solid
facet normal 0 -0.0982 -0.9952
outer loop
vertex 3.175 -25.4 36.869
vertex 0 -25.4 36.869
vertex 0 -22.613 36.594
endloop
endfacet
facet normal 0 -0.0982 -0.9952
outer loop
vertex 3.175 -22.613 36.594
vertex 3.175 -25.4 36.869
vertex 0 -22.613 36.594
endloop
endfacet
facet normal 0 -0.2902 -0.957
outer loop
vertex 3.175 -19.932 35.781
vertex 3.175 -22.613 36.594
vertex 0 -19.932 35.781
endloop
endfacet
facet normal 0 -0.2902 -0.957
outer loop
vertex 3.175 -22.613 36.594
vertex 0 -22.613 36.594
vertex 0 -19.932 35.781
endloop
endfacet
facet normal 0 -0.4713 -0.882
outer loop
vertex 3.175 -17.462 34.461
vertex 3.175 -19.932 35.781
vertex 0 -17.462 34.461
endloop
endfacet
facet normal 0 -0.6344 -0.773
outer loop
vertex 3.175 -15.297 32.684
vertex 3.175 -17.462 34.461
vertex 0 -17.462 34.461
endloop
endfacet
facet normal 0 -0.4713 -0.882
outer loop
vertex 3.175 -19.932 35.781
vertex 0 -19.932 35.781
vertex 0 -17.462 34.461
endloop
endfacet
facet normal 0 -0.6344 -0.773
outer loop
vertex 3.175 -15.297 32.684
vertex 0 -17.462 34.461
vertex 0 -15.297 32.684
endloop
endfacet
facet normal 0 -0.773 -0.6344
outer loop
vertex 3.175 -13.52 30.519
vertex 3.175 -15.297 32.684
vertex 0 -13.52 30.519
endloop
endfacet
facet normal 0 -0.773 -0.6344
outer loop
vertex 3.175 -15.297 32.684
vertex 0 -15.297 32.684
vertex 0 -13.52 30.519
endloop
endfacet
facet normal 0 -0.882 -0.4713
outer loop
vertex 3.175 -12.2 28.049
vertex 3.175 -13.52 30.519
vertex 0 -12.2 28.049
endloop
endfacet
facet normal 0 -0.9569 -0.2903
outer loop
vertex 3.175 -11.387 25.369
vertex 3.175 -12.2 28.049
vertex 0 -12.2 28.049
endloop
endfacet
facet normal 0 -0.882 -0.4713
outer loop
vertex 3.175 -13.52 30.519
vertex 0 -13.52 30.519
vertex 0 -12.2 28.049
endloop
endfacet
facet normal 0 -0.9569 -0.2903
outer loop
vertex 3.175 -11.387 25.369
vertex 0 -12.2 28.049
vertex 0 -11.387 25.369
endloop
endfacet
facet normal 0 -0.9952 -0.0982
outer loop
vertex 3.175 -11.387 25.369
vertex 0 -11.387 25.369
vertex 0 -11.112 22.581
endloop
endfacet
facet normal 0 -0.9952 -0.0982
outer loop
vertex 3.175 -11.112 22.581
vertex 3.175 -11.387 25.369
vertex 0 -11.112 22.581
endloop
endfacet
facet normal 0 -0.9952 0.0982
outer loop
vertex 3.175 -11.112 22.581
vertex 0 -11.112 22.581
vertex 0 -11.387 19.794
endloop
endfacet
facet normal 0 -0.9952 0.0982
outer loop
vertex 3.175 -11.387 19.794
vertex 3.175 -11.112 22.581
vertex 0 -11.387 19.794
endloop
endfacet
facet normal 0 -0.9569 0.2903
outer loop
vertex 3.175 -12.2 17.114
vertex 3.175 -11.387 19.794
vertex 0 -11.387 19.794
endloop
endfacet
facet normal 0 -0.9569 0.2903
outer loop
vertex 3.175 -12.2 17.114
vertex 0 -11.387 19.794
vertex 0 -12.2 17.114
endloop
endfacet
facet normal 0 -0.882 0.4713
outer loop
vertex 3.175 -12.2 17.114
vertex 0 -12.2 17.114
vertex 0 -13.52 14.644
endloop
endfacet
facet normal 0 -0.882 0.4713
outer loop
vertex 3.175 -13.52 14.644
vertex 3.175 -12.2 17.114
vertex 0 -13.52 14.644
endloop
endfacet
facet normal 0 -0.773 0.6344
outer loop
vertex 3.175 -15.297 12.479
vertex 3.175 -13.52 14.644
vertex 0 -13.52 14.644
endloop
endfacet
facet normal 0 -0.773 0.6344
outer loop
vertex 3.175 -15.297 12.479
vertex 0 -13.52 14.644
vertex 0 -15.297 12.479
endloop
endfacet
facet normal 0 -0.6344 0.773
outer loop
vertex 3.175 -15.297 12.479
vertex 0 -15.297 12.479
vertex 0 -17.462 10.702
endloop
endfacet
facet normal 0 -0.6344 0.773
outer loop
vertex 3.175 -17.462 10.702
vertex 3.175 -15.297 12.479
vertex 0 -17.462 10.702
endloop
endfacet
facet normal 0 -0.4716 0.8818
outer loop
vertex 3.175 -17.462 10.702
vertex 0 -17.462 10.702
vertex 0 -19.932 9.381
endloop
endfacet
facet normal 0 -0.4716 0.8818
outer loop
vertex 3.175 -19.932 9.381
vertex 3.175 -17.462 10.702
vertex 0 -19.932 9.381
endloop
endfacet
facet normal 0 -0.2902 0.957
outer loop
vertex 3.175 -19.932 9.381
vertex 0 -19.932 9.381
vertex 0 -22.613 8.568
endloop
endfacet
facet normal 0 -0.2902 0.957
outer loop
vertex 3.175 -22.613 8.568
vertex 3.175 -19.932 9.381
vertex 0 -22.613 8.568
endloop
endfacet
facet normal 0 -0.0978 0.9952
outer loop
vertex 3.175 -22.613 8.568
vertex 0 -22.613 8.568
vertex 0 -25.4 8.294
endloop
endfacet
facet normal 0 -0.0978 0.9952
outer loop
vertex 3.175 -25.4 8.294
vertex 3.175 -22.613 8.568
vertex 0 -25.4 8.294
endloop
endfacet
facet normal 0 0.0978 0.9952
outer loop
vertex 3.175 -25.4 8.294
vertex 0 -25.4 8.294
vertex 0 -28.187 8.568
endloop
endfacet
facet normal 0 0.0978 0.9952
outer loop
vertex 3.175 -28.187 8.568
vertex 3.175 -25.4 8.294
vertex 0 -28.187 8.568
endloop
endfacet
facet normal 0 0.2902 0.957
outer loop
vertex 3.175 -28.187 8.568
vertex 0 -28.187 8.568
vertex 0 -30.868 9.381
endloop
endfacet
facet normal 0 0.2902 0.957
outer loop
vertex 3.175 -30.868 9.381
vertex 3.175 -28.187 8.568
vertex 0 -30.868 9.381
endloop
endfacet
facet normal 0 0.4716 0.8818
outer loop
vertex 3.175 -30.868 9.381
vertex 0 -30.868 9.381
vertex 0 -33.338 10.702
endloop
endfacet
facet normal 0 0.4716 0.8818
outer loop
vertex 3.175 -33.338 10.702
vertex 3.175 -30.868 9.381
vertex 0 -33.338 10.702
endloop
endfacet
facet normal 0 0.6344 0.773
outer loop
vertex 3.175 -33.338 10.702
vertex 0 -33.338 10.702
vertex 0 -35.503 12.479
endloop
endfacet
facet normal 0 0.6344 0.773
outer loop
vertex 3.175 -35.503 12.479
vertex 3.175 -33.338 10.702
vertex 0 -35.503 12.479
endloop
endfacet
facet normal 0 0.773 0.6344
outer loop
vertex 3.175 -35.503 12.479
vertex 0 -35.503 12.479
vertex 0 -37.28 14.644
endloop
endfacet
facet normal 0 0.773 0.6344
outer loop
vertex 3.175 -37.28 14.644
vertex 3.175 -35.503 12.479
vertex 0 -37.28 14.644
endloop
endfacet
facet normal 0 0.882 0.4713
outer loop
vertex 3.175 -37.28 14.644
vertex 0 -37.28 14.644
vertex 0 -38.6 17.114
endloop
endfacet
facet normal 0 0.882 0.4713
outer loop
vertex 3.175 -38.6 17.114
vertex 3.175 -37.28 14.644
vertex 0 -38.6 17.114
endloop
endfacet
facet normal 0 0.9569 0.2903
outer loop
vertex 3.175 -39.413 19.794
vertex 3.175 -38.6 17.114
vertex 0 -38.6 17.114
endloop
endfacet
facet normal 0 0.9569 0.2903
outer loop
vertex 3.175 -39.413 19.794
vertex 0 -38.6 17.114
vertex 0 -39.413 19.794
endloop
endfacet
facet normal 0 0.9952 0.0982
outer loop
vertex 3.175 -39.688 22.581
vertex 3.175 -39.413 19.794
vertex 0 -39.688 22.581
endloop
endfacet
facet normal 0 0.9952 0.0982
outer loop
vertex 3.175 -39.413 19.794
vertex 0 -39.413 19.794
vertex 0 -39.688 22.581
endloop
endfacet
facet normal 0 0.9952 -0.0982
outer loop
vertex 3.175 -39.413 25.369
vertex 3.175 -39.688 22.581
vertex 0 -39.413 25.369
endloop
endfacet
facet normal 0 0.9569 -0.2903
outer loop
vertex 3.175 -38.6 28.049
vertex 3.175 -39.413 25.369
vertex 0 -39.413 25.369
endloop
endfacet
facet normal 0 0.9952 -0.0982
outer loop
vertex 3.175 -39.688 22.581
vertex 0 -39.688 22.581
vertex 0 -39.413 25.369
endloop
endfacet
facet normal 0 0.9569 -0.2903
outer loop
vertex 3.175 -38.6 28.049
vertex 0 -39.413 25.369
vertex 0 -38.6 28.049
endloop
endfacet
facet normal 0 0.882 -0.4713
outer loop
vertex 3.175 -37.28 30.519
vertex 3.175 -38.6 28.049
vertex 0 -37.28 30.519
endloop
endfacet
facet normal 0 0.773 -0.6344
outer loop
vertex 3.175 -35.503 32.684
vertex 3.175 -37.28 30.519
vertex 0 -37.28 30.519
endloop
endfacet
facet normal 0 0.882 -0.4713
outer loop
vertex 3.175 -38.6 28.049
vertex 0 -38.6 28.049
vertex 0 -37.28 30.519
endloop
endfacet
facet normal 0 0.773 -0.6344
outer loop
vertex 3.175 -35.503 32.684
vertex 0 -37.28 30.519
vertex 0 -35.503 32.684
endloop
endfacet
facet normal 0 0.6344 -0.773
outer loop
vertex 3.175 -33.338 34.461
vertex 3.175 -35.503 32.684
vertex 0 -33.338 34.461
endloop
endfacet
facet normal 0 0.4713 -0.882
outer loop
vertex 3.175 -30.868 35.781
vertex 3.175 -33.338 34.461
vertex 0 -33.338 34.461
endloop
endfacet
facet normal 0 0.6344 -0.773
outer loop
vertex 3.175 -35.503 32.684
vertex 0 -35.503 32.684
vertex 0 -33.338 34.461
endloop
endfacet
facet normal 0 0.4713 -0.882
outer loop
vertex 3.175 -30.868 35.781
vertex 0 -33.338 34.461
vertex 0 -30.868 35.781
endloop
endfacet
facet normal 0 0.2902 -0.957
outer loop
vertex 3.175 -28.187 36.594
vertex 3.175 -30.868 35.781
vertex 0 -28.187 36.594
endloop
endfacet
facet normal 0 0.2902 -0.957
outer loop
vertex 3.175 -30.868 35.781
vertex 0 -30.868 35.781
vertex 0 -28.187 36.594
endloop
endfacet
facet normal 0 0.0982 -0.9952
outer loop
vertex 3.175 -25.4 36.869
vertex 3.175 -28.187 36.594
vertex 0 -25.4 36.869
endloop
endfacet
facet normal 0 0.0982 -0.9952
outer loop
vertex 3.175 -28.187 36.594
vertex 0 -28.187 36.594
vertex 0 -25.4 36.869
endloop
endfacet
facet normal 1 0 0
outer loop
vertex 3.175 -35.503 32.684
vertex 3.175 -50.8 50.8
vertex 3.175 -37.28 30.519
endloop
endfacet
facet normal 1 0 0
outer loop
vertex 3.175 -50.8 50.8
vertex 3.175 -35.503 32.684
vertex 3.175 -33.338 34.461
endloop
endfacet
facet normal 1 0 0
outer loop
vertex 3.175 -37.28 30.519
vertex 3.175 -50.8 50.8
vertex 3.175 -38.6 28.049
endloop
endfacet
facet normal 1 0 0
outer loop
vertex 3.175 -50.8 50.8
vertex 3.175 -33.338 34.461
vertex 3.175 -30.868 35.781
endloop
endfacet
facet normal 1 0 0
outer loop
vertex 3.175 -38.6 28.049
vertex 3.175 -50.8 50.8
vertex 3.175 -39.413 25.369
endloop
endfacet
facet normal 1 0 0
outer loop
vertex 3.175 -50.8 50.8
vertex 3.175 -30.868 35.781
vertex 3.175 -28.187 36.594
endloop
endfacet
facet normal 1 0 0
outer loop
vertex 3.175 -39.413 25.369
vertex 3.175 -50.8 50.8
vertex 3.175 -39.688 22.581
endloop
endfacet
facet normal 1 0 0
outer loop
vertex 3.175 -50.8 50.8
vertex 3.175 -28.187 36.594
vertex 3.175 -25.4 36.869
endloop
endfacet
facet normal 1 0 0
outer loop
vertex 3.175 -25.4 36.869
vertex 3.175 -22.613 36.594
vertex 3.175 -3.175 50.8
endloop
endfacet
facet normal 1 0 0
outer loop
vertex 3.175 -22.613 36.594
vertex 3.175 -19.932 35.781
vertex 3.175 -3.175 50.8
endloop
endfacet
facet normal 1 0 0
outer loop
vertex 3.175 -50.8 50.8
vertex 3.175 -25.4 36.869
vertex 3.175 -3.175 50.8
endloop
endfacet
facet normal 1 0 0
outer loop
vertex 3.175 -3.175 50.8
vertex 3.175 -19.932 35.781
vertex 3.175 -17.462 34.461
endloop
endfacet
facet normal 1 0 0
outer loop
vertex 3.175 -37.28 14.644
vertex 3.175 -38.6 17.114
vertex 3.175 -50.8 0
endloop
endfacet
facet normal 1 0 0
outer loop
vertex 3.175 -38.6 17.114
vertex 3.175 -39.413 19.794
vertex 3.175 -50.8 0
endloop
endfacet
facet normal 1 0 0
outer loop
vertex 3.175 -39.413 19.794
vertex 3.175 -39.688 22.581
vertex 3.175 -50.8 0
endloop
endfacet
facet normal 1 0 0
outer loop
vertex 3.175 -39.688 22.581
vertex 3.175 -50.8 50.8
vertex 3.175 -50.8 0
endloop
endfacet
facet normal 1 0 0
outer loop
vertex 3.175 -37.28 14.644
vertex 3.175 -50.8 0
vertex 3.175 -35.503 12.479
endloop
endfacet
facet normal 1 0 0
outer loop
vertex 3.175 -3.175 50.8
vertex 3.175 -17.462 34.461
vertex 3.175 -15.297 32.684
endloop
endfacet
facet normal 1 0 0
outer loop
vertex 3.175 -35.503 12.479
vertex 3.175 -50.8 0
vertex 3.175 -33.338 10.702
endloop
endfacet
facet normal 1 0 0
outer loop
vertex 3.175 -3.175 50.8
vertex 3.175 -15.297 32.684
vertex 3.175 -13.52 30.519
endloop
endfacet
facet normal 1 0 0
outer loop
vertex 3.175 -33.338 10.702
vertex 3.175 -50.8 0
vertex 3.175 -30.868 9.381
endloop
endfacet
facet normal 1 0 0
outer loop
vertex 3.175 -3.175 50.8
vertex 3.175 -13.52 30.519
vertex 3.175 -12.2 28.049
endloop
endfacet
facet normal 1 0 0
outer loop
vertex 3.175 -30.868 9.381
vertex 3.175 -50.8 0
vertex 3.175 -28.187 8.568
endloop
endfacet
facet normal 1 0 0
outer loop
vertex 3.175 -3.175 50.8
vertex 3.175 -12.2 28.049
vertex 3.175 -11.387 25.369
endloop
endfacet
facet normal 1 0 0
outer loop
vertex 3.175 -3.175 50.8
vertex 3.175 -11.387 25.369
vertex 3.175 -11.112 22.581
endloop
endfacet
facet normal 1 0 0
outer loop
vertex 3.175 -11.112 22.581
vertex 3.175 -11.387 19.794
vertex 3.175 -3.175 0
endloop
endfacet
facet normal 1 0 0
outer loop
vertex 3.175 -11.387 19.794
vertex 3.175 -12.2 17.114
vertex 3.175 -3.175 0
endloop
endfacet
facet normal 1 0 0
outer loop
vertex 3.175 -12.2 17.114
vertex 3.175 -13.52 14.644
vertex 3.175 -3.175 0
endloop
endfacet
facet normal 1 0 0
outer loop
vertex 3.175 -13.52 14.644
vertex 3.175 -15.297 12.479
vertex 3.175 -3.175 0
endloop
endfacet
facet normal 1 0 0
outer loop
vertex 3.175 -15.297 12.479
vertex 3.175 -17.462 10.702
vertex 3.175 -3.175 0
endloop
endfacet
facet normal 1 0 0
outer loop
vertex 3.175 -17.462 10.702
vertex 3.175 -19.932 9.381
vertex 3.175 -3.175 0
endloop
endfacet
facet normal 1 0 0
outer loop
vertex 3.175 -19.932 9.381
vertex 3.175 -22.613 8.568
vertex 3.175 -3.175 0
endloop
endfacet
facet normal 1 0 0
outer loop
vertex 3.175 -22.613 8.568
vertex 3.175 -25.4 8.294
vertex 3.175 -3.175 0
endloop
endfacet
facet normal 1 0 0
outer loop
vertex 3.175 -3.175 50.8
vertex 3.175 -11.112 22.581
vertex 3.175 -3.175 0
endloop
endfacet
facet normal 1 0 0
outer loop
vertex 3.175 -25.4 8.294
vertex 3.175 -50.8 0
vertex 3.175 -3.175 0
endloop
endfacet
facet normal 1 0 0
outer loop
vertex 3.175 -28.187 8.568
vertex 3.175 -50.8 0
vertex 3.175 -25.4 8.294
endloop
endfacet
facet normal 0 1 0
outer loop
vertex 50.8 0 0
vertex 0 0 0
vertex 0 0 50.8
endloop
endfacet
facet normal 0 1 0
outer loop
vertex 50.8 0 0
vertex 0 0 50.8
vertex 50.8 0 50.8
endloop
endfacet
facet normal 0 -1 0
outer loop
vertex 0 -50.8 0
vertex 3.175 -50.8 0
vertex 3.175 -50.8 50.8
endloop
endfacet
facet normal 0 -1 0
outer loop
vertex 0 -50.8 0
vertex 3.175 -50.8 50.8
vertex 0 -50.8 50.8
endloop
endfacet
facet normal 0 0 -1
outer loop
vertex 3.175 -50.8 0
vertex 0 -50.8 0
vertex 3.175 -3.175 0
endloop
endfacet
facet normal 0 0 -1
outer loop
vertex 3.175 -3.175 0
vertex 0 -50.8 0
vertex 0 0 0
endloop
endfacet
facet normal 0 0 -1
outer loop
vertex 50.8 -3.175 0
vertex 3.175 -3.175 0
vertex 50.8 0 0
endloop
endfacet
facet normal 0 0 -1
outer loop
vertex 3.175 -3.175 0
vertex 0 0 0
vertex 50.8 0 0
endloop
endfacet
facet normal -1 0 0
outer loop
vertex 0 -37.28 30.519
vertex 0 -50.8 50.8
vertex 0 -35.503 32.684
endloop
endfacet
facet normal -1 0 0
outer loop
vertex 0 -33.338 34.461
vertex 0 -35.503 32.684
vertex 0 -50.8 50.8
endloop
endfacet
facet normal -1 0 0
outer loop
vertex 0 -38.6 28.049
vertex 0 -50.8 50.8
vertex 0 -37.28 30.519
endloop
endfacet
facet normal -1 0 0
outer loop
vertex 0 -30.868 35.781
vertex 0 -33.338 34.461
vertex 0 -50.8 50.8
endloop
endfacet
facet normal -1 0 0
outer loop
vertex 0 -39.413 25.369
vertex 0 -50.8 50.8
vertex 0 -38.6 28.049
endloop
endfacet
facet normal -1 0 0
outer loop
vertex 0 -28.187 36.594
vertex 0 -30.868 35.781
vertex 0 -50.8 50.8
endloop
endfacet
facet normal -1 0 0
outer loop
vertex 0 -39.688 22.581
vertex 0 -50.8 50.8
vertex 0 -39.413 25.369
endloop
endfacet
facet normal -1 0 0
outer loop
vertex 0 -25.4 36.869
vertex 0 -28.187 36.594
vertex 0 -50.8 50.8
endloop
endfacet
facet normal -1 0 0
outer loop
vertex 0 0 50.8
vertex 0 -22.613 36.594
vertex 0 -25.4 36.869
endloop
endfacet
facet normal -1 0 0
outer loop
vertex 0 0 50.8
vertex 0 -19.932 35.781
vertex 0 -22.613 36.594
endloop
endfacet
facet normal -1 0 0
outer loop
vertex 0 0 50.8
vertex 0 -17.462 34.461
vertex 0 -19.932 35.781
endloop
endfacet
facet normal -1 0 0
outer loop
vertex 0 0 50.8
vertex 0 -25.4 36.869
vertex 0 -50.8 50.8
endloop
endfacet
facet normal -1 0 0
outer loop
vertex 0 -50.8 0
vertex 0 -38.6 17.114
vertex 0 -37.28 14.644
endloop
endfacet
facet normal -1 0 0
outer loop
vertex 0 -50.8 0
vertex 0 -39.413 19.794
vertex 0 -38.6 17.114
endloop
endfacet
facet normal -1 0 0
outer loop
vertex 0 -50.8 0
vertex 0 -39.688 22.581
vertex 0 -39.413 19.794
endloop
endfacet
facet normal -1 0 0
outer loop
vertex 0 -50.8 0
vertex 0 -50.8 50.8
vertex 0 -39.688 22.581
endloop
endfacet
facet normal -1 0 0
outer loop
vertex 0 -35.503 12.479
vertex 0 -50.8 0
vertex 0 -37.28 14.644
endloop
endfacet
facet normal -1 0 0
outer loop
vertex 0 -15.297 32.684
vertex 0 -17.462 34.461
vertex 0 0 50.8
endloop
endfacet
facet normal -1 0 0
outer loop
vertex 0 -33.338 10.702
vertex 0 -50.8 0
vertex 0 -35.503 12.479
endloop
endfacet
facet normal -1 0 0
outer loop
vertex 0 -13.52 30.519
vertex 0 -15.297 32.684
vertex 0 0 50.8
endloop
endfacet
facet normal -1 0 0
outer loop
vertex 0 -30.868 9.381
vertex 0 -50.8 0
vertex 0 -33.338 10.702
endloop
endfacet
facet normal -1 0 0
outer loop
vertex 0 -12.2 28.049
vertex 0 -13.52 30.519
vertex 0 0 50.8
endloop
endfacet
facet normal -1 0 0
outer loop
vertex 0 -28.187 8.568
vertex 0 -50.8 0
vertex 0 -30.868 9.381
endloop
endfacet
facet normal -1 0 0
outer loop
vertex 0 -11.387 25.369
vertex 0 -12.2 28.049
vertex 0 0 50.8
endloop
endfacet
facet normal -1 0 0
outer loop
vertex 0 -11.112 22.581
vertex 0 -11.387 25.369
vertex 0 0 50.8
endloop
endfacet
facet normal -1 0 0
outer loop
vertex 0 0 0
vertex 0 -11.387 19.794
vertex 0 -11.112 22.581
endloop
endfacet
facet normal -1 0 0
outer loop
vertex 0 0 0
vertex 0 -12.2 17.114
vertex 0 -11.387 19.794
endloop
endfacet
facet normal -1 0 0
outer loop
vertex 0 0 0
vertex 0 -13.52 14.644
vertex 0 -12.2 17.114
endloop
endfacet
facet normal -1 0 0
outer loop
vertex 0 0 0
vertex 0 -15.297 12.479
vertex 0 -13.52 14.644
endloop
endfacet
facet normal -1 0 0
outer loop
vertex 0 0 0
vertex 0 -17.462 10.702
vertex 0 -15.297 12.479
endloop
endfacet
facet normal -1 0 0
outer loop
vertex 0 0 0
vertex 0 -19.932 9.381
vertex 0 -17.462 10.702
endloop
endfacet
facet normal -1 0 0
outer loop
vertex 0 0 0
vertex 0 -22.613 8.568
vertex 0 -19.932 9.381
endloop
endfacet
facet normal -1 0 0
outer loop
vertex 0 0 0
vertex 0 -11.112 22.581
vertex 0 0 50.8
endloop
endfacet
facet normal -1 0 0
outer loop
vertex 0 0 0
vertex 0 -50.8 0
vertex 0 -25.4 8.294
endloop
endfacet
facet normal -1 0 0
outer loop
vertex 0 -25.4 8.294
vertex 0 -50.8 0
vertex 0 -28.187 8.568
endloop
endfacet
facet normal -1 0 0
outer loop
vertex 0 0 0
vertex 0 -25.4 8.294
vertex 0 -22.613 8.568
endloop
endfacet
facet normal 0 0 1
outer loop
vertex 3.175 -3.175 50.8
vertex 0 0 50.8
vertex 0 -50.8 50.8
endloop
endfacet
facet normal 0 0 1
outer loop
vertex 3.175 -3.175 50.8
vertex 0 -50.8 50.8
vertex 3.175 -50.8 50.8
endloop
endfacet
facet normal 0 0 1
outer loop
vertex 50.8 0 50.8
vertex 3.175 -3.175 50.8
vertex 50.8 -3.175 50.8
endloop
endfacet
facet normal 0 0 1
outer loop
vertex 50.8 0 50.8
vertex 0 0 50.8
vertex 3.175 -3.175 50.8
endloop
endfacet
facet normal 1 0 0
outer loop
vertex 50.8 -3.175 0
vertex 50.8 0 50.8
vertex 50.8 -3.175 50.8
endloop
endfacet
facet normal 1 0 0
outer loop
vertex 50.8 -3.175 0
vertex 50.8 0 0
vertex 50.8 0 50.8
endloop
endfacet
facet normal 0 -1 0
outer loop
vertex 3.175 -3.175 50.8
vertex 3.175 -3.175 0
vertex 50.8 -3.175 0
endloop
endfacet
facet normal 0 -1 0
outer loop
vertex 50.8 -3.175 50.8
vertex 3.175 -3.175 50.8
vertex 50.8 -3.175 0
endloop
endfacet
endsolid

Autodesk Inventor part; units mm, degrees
ref_plane "YZ Plane" through (0, 0, 0) normal (1, 0, 0) x (0, 1, 0)
ref_plane "XZ Plane" through (0, 0, 0) normal (0, 1, 0) x (-1, 0, 0)
ref_plane "XY Plane" through (0, 0, 0) normal (0, 0, 1) x (1, 0, 0)
sketch "Sketch1" plane through (0, 0, 0) normal (0, 0, 1) x (1, 0, 0)
  line L0 (0, 0) -> (50.8, 0)
  line L1 (50.8, 0) -> (50.8, -3.175)
  line L2 (3.175, -50.8) -> (0, -50.8)
  line L3 (0, -50.8) -> (0, 0)
  line L4 (3.175, -50.8) -> (3.175, -3.175)
  line L5 (3.175, -3.175) -> (50.8, -3.175)
  dimension "d0" = 50.8
  dimension "d1" = 50.8
  dimension "d2" = 3.175
  dimension "d3" = 3.175
extrude "Extrusion1" add sketch "Sketch1" along normal blind 50.8
sketch "Sketch2" plane through (0, -50.8, 0) normal (-1, 0, 0) x (0, 0, 1)
  circle A0 centre (22.5814, 25.4) radius 14.2875
  line L0 (0, 50.8) -> (50.8, 50.8) projected
  line L1 (0, 0) -> (50.8, 0) projected
  dimension "d6" = 25.4
  dimension "d7" = 25.4
  dimension "d8" = 28.575
extrude "Extrusion2" cut sketch "Sketch2" against normal through all
properties part number "Lbracket" material "Aluminum 6061"
